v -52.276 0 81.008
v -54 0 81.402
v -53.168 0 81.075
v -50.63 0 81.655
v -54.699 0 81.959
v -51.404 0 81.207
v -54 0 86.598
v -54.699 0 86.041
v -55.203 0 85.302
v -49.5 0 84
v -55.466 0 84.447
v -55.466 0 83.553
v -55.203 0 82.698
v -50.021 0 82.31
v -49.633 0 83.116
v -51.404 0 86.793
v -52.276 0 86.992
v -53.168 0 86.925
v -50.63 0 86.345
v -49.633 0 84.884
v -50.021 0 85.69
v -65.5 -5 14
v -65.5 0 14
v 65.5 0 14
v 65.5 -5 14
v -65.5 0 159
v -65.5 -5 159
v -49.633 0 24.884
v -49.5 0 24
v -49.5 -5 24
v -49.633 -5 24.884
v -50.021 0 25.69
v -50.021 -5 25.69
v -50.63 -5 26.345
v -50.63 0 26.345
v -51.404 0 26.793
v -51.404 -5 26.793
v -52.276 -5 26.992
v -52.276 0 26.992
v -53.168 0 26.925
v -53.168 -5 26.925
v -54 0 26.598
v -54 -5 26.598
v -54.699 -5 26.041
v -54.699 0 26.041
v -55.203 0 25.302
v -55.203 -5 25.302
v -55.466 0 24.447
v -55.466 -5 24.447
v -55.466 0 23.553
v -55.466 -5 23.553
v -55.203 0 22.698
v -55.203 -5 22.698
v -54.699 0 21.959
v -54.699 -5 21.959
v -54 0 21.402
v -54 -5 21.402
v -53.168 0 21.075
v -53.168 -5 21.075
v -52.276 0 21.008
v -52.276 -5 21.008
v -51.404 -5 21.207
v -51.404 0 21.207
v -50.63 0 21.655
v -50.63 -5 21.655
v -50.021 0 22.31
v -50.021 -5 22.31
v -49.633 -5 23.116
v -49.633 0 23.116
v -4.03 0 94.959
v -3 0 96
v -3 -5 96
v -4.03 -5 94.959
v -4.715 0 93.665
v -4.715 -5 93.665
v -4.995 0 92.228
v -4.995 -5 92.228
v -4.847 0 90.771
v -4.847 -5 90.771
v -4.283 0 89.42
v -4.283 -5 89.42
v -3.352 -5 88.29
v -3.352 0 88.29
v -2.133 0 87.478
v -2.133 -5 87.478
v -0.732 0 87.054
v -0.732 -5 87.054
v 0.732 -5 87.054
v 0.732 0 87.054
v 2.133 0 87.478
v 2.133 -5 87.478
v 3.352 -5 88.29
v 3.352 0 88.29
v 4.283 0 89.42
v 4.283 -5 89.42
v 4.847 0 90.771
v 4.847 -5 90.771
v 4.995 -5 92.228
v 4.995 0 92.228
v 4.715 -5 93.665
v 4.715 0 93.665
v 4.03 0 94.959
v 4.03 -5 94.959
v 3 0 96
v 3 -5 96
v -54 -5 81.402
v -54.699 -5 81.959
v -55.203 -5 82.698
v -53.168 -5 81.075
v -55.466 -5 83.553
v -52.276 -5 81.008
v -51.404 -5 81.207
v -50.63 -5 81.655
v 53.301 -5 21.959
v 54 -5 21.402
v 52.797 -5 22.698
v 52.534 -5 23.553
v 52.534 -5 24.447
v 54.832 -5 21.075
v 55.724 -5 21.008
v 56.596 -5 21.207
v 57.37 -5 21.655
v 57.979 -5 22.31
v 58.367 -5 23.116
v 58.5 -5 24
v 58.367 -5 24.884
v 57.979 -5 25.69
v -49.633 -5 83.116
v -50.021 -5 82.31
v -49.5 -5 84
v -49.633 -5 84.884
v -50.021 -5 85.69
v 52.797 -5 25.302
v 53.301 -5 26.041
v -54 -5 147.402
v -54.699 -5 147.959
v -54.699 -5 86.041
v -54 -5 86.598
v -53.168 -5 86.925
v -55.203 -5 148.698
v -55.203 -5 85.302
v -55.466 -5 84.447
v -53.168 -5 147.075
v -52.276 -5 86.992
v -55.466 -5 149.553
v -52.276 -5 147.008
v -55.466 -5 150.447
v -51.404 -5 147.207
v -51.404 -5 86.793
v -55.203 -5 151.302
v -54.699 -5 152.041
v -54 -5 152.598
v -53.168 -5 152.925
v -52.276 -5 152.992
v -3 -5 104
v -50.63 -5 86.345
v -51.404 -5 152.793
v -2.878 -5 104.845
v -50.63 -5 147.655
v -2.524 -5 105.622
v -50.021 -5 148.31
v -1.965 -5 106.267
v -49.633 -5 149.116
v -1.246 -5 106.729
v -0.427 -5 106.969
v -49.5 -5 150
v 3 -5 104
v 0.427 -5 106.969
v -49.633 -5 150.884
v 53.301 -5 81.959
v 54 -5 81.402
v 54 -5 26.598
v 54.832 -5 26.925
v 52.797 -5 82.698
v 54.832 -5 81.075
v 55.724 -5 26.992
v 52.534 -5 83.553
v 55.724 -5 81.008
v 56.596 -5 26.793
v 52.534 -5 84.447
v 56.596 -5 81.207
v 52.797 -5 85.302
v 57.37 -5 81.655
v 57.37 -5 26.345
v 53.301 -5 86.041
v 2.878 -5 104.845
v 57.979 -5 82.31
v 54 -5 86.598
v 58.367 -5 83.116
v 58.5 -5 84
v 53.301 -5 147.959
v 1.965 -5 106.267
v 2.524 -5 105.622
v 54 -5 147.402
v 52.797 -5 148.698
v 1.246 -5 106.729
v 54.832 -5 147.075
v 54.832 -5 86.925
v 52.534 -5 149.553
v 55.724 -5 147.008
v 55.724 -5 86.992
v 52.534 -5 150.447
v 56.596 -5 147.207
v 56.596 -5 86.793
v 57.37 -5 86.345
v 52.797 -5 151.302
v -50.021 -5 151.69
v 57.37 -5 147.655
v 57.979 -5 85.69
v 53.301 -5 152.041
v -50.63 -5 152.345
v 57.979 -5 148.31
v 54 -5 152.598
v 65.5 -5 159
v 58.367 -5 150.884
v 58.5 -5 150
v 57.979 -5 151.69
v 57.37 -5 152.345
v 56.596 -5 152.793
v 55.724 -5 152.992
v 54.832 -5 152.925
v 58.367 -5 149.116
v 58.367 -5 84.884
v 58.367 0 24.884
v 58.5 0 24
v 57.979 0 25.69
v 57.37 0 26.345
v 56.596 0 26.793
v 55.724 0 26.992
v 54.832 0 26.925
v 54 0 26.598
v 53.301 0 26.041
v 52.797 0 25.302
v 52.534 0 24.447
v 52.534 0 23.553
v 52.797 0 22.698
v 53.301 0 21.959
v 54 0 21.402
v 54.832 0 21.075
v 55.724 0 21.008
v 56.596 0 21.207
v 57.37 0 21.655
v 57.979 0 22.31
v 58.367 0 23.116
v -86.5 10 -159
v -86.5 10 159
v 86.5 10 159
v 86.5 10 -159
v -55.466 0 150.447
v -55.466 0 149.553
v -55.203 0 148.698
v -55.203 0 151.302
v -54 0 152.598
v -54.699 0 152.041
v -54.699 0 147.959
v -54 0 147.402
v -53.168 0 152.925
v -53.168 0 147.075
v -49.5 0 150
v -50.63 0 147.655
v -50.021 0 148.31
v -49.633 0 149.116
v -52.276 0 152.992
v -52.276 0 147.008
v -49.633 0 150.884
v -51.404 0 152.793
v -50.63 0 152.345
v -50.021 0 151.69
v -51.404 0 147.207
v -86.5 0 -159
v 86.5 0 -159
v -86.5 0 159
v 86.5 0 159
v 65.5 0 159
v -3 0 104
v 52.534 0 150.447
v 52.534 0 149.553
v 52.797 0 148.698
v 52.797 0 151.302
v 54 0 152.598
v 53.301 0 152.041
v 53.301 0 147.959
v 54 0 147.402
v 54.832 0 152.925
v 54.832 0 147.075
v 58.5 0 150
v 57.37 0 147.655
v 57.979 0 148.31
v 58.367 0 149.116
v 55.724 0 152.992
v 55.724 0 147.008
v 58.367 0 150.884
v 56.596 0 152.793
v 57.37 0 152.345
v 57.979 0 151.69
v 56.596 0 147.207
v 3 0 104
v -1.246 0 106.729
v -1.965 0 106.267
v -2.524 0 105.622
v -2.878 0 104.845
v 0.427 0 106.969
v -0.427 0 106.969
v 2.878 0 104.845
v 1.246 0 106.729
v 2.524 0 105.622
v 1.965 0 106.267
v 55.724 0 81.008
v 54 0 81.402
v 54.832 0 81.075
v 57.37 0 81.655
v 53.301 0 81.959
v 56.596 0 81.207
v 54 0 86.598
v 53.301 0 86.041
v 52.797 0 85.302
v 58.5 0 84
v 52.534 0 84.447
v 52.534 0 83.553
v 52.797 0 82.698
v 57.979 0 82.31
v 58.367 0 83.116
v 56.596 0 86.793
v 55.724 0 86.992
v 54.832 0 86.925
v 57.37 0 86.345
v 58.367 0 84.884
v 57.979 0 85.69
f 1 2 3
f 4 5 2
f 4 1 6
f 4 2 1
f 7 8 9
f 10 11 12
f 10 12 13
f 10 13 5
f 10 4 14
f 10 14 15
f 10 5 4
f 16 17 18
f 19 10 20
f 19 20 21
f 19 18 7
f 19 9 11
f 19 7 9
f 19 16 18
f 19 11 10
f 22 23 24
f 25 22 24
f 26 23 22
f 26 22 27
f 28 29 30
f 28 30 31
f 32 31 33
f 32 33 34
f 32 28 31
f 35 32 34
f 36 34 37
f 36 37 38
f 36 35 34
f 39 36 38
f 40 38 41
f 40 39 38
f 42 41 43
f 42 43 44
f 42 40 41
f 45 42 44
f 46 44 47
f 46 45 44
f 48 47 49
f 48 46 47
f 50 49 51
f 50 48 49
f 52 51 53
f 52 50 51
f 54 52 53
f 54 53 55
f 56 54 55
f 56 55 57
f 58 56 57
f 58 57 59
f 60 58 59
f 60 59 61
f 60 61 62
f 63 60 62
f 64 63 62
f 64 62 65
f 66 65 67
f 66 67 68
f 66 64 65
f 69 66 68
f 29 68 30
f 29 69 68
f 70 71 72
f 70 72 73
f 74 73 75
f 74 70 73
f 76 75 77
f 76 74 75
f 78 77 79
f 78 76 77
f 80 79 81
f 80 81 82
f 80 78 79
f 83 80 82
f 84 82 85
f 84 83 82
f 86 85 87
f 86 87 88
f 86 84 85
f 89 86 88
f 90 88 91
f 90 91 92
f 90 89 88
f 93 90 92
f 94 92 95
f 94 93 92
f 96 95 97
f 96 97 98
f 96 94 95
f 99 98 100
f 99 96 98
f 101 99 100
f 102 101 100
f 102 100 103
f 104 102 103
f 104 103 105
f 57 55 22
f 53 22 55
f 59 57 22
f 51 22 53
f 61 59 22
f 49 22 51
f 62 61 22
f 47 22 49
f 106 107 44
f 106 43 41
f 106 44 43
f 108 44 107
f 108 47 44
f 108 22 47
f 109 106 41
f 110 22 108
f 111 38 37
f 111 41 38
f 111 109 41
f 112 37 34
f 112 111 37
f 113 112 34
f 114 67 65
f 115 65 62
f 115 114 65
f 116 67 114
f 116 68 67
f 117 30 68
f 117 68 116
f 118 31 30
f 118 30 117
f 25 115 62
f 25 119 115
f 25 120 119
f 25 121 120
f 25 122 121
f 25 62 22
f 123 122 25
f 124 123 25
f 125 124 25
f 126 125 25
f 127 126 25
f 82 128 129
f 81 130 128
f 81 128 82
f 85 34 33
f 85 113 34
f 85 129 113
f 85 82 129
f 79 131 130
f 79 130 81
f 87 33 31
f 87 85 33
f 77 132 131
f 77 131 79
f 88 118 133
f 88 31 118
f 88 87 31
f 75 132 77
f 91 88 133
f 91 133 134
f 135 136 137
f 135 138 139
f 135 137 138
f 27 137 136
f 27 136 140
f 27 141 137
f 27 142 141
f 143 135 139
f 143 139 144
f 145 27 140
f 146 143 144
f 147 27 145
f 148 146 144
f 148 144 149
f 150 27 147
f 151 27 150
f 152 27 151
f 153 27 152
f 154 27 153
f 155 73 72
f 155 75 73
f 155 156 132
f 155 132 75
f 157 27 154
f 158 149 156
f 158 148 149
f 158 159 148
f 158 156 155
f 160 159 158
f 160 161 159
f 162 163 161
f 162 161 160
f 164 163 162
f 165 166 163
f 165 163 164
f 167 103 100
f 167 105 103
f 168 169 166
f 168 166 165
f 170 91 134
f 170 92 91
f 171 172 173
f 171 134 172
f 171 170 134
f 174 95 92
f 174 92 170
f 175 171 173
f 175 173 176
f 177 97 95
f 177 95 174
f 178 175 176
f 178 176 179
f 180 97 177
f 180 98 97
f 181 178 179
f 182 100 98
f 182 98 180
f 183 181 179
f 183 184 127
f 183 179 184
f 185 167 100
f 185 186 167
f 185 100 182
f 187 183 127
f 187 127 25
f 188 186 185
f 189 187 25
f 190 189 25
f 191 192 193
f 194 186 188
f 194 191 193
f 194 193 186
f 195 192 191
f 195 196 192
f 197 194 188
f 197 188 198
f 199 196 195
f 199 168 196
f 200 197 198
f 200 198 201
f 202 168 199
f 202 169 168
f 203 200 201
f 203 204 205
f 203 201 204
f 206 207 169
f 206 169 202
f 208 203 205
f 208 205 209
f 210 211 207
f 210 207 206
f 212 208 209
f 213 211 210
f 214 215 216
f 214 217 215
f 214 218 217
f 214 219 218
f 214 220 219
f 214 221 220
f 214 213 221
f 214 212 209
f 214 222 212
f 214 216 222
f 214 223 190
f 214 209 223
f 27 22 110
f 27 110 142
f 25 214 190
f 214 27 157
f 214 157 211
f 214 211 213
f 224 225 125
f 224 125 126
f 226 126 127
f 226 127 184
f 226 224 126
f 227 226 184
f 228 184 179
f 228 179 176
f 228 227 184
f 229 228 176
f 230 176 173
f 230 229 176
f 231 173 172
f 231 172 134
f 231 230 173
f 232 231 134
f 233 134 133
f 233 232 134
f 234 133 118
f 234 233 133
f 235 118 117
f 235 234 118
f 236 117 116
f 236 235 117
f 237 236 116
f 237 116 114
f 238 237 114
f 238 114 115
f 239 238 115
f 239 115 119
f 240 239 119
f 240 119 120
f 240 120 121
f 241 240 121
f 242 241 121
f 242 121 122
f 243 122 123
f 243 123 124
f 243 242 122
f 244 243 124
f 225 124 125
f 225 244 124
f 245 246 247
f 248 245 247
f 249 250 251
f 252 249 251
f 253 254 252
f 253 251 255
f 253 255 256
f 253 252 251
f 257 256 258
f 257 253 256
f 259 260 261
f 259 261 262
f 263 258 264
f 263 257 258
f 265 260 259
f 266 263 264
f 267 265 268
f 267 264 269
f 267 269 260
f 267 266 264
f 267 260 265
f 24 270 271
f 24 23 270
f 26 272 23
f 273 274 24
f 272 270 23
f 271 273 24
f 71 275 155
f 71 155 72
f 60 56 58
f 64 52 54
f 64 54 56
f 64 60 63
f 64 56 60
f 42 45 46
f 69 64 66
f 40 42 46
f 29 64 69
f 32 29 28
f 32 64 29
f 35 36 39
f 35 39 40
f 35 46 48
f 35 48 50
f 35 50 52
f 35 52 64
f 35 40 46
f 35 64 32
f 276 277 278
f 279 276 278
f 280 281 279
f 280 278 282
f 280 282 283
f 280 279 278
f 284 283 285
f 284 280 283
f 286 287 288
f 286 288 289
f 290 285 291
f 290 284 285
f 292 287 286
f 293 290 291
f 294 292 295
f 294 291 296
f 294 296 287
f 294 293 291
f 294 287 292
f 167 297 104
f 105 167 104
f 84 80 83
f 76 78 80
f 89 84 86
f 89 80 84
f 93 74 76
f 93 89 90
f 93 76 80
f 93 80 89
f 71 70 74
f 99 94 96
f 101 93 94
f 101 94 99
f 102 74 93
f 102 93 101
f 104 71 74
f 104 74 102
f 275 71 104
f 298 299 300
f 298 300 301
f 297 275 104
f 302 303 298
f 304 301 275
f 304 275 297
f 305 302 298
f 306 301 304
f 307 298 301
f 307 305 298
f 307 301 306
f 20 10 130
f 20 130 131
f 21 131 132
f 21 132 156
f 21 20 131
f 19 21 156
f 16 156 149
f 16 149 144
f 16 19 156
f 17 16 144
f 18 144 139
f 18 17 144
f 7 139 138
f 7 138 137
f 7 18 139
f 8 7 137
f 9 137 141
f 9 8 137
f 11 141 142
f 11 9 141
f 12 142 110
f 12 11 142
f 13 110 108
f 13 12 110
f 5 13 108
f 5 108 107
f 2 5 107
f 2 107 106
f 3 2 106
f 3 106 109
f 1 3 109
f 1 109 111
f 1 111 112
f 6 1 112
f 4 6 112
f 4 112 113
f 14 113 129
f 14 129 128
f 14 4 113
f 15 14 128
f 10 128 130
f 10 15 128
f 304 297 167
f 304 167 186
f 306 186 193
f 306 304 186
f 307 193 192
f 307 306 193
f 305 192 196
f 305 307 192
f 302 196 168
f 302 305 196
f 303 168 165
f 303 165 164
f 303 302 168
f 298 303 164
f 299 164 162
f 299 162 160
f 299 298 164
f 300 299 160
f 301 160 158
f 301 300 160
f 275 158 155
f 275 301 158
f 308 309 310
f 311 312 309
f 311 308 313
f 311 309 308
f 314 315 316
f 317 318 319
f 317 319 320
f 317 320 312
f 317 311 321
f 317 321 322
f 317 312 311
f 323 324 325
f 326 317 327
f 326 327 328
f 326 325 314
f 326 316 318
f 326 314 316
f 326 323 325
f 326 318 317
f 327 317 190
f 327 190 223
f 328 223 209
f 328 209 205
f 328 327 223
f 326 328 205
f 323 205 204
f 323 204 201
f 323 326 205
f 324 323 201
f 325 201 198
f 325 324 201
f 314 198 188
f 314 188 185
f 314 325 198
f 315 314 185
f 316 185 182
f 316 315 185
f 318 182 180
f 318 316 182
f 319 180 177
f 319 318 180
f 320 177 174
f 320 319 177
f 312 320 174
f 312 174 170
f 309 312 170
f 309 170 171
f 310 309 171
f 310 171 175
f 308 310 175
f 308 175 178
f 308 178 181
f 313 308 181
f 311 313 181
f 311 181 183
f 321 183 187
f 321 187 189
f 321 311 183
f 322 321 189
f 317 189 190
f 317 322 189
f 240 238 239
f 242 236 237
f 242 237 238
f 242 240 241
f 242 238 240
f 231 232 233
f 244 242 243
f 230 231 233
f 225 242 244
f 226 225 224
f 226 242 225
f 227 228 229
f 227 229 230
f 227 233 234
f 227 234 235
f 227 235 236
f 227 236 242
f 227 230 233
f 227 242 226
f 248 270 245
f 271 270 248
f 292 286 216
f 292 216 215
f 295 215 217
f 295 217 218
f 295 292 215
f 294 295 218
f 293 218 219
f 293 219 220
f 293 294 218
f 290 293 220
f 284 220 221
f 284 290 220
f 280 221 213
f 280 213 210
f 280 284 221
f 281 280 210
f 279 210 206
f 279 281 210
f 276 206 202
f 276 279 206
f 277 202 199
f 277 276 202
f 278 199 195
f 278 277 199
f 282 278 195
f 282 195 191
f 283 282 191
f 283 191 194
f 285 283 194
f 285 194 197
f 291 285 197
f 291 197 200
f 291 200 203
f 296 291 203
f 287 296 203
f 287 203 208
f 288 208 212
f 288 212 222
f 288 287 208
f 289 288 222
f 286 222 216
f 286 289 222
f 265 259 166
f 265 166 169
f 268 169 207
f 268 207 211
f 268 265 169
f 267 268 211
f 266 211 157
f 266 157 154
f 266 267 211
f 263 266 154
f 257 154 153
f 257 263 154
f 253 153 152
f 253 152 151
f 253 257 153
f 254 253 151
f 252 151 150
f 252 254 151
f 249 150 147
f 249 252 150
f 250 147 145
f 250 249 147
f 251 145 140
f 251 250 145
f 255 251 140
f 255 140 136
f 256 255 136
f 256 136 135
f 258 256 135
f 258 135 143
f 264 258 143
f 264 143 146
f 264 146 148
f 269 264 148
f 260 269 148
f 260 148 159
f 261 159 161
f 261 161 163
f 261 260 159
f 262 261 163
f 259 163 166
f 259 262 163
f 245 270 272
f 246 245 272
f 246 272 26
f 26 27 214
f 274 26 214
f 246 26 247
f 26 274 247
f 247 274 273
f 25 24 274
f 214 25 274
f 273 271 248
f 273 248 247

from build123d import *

# Parameters (mm, degrees)
SKETCH_W     = 173
SKETCH_H     = 318
PAD_DEPTH    = 10
SKETCH001_W  = 131
SKETCH001_H  = 145
PAD001_DEPTH = 5
SKETCH002_R  = 3
POCKET_DEPTH = 5


with BuildPart() as part:
    # Sketch → Pad (new body)
    with BuildSketch(Plane.XZ):
        Rectangle(SKETCH_W, SKETCH_H)
    extrude(amount=-PAD_DEPTH)

    # Sketch001 → Pad001 (join)
    with BuildSketch(Plane.XZ):
        with Locations((0, 86.5)):
            Rectangle(SKETCH001_W, SKETCH001_H)
    extrude(amount=PAD001_DEPTH)

    # Sketch002 → Pocket (cut)
    with BuildSketch(Plane.XZ):
        with Locations((-52.5, 150)):
            Circle(SKETCH002_R)
        with Locations((-52.5, 84)):
            Circle(SKETCH002_R)
        with Locations((-52.5, 24)):
            Circle(SKETCH002_R)
        with Locations((55.5, 150)):
            Circle(SKETCH002_R)
        with Locations((55.5, 84)):
            Circle(SKETCH002_R)
        with Locations((55.5, 24)):
            Circle(SKETCH002_R)
        with BuildLine():
            ThreePointArc((3, 104), (0, 107), (-3, 104))
            Line((-3, 104), (-3, 96))
            ThreePointArc((-3, 96), (0, 87), (3, 96))
            Line((3, 104), (3, 96))
        make_face()
    extrude(amount=POCKET_DEPTH, mode=Mode.SUBTRACT)


solid = part.part
